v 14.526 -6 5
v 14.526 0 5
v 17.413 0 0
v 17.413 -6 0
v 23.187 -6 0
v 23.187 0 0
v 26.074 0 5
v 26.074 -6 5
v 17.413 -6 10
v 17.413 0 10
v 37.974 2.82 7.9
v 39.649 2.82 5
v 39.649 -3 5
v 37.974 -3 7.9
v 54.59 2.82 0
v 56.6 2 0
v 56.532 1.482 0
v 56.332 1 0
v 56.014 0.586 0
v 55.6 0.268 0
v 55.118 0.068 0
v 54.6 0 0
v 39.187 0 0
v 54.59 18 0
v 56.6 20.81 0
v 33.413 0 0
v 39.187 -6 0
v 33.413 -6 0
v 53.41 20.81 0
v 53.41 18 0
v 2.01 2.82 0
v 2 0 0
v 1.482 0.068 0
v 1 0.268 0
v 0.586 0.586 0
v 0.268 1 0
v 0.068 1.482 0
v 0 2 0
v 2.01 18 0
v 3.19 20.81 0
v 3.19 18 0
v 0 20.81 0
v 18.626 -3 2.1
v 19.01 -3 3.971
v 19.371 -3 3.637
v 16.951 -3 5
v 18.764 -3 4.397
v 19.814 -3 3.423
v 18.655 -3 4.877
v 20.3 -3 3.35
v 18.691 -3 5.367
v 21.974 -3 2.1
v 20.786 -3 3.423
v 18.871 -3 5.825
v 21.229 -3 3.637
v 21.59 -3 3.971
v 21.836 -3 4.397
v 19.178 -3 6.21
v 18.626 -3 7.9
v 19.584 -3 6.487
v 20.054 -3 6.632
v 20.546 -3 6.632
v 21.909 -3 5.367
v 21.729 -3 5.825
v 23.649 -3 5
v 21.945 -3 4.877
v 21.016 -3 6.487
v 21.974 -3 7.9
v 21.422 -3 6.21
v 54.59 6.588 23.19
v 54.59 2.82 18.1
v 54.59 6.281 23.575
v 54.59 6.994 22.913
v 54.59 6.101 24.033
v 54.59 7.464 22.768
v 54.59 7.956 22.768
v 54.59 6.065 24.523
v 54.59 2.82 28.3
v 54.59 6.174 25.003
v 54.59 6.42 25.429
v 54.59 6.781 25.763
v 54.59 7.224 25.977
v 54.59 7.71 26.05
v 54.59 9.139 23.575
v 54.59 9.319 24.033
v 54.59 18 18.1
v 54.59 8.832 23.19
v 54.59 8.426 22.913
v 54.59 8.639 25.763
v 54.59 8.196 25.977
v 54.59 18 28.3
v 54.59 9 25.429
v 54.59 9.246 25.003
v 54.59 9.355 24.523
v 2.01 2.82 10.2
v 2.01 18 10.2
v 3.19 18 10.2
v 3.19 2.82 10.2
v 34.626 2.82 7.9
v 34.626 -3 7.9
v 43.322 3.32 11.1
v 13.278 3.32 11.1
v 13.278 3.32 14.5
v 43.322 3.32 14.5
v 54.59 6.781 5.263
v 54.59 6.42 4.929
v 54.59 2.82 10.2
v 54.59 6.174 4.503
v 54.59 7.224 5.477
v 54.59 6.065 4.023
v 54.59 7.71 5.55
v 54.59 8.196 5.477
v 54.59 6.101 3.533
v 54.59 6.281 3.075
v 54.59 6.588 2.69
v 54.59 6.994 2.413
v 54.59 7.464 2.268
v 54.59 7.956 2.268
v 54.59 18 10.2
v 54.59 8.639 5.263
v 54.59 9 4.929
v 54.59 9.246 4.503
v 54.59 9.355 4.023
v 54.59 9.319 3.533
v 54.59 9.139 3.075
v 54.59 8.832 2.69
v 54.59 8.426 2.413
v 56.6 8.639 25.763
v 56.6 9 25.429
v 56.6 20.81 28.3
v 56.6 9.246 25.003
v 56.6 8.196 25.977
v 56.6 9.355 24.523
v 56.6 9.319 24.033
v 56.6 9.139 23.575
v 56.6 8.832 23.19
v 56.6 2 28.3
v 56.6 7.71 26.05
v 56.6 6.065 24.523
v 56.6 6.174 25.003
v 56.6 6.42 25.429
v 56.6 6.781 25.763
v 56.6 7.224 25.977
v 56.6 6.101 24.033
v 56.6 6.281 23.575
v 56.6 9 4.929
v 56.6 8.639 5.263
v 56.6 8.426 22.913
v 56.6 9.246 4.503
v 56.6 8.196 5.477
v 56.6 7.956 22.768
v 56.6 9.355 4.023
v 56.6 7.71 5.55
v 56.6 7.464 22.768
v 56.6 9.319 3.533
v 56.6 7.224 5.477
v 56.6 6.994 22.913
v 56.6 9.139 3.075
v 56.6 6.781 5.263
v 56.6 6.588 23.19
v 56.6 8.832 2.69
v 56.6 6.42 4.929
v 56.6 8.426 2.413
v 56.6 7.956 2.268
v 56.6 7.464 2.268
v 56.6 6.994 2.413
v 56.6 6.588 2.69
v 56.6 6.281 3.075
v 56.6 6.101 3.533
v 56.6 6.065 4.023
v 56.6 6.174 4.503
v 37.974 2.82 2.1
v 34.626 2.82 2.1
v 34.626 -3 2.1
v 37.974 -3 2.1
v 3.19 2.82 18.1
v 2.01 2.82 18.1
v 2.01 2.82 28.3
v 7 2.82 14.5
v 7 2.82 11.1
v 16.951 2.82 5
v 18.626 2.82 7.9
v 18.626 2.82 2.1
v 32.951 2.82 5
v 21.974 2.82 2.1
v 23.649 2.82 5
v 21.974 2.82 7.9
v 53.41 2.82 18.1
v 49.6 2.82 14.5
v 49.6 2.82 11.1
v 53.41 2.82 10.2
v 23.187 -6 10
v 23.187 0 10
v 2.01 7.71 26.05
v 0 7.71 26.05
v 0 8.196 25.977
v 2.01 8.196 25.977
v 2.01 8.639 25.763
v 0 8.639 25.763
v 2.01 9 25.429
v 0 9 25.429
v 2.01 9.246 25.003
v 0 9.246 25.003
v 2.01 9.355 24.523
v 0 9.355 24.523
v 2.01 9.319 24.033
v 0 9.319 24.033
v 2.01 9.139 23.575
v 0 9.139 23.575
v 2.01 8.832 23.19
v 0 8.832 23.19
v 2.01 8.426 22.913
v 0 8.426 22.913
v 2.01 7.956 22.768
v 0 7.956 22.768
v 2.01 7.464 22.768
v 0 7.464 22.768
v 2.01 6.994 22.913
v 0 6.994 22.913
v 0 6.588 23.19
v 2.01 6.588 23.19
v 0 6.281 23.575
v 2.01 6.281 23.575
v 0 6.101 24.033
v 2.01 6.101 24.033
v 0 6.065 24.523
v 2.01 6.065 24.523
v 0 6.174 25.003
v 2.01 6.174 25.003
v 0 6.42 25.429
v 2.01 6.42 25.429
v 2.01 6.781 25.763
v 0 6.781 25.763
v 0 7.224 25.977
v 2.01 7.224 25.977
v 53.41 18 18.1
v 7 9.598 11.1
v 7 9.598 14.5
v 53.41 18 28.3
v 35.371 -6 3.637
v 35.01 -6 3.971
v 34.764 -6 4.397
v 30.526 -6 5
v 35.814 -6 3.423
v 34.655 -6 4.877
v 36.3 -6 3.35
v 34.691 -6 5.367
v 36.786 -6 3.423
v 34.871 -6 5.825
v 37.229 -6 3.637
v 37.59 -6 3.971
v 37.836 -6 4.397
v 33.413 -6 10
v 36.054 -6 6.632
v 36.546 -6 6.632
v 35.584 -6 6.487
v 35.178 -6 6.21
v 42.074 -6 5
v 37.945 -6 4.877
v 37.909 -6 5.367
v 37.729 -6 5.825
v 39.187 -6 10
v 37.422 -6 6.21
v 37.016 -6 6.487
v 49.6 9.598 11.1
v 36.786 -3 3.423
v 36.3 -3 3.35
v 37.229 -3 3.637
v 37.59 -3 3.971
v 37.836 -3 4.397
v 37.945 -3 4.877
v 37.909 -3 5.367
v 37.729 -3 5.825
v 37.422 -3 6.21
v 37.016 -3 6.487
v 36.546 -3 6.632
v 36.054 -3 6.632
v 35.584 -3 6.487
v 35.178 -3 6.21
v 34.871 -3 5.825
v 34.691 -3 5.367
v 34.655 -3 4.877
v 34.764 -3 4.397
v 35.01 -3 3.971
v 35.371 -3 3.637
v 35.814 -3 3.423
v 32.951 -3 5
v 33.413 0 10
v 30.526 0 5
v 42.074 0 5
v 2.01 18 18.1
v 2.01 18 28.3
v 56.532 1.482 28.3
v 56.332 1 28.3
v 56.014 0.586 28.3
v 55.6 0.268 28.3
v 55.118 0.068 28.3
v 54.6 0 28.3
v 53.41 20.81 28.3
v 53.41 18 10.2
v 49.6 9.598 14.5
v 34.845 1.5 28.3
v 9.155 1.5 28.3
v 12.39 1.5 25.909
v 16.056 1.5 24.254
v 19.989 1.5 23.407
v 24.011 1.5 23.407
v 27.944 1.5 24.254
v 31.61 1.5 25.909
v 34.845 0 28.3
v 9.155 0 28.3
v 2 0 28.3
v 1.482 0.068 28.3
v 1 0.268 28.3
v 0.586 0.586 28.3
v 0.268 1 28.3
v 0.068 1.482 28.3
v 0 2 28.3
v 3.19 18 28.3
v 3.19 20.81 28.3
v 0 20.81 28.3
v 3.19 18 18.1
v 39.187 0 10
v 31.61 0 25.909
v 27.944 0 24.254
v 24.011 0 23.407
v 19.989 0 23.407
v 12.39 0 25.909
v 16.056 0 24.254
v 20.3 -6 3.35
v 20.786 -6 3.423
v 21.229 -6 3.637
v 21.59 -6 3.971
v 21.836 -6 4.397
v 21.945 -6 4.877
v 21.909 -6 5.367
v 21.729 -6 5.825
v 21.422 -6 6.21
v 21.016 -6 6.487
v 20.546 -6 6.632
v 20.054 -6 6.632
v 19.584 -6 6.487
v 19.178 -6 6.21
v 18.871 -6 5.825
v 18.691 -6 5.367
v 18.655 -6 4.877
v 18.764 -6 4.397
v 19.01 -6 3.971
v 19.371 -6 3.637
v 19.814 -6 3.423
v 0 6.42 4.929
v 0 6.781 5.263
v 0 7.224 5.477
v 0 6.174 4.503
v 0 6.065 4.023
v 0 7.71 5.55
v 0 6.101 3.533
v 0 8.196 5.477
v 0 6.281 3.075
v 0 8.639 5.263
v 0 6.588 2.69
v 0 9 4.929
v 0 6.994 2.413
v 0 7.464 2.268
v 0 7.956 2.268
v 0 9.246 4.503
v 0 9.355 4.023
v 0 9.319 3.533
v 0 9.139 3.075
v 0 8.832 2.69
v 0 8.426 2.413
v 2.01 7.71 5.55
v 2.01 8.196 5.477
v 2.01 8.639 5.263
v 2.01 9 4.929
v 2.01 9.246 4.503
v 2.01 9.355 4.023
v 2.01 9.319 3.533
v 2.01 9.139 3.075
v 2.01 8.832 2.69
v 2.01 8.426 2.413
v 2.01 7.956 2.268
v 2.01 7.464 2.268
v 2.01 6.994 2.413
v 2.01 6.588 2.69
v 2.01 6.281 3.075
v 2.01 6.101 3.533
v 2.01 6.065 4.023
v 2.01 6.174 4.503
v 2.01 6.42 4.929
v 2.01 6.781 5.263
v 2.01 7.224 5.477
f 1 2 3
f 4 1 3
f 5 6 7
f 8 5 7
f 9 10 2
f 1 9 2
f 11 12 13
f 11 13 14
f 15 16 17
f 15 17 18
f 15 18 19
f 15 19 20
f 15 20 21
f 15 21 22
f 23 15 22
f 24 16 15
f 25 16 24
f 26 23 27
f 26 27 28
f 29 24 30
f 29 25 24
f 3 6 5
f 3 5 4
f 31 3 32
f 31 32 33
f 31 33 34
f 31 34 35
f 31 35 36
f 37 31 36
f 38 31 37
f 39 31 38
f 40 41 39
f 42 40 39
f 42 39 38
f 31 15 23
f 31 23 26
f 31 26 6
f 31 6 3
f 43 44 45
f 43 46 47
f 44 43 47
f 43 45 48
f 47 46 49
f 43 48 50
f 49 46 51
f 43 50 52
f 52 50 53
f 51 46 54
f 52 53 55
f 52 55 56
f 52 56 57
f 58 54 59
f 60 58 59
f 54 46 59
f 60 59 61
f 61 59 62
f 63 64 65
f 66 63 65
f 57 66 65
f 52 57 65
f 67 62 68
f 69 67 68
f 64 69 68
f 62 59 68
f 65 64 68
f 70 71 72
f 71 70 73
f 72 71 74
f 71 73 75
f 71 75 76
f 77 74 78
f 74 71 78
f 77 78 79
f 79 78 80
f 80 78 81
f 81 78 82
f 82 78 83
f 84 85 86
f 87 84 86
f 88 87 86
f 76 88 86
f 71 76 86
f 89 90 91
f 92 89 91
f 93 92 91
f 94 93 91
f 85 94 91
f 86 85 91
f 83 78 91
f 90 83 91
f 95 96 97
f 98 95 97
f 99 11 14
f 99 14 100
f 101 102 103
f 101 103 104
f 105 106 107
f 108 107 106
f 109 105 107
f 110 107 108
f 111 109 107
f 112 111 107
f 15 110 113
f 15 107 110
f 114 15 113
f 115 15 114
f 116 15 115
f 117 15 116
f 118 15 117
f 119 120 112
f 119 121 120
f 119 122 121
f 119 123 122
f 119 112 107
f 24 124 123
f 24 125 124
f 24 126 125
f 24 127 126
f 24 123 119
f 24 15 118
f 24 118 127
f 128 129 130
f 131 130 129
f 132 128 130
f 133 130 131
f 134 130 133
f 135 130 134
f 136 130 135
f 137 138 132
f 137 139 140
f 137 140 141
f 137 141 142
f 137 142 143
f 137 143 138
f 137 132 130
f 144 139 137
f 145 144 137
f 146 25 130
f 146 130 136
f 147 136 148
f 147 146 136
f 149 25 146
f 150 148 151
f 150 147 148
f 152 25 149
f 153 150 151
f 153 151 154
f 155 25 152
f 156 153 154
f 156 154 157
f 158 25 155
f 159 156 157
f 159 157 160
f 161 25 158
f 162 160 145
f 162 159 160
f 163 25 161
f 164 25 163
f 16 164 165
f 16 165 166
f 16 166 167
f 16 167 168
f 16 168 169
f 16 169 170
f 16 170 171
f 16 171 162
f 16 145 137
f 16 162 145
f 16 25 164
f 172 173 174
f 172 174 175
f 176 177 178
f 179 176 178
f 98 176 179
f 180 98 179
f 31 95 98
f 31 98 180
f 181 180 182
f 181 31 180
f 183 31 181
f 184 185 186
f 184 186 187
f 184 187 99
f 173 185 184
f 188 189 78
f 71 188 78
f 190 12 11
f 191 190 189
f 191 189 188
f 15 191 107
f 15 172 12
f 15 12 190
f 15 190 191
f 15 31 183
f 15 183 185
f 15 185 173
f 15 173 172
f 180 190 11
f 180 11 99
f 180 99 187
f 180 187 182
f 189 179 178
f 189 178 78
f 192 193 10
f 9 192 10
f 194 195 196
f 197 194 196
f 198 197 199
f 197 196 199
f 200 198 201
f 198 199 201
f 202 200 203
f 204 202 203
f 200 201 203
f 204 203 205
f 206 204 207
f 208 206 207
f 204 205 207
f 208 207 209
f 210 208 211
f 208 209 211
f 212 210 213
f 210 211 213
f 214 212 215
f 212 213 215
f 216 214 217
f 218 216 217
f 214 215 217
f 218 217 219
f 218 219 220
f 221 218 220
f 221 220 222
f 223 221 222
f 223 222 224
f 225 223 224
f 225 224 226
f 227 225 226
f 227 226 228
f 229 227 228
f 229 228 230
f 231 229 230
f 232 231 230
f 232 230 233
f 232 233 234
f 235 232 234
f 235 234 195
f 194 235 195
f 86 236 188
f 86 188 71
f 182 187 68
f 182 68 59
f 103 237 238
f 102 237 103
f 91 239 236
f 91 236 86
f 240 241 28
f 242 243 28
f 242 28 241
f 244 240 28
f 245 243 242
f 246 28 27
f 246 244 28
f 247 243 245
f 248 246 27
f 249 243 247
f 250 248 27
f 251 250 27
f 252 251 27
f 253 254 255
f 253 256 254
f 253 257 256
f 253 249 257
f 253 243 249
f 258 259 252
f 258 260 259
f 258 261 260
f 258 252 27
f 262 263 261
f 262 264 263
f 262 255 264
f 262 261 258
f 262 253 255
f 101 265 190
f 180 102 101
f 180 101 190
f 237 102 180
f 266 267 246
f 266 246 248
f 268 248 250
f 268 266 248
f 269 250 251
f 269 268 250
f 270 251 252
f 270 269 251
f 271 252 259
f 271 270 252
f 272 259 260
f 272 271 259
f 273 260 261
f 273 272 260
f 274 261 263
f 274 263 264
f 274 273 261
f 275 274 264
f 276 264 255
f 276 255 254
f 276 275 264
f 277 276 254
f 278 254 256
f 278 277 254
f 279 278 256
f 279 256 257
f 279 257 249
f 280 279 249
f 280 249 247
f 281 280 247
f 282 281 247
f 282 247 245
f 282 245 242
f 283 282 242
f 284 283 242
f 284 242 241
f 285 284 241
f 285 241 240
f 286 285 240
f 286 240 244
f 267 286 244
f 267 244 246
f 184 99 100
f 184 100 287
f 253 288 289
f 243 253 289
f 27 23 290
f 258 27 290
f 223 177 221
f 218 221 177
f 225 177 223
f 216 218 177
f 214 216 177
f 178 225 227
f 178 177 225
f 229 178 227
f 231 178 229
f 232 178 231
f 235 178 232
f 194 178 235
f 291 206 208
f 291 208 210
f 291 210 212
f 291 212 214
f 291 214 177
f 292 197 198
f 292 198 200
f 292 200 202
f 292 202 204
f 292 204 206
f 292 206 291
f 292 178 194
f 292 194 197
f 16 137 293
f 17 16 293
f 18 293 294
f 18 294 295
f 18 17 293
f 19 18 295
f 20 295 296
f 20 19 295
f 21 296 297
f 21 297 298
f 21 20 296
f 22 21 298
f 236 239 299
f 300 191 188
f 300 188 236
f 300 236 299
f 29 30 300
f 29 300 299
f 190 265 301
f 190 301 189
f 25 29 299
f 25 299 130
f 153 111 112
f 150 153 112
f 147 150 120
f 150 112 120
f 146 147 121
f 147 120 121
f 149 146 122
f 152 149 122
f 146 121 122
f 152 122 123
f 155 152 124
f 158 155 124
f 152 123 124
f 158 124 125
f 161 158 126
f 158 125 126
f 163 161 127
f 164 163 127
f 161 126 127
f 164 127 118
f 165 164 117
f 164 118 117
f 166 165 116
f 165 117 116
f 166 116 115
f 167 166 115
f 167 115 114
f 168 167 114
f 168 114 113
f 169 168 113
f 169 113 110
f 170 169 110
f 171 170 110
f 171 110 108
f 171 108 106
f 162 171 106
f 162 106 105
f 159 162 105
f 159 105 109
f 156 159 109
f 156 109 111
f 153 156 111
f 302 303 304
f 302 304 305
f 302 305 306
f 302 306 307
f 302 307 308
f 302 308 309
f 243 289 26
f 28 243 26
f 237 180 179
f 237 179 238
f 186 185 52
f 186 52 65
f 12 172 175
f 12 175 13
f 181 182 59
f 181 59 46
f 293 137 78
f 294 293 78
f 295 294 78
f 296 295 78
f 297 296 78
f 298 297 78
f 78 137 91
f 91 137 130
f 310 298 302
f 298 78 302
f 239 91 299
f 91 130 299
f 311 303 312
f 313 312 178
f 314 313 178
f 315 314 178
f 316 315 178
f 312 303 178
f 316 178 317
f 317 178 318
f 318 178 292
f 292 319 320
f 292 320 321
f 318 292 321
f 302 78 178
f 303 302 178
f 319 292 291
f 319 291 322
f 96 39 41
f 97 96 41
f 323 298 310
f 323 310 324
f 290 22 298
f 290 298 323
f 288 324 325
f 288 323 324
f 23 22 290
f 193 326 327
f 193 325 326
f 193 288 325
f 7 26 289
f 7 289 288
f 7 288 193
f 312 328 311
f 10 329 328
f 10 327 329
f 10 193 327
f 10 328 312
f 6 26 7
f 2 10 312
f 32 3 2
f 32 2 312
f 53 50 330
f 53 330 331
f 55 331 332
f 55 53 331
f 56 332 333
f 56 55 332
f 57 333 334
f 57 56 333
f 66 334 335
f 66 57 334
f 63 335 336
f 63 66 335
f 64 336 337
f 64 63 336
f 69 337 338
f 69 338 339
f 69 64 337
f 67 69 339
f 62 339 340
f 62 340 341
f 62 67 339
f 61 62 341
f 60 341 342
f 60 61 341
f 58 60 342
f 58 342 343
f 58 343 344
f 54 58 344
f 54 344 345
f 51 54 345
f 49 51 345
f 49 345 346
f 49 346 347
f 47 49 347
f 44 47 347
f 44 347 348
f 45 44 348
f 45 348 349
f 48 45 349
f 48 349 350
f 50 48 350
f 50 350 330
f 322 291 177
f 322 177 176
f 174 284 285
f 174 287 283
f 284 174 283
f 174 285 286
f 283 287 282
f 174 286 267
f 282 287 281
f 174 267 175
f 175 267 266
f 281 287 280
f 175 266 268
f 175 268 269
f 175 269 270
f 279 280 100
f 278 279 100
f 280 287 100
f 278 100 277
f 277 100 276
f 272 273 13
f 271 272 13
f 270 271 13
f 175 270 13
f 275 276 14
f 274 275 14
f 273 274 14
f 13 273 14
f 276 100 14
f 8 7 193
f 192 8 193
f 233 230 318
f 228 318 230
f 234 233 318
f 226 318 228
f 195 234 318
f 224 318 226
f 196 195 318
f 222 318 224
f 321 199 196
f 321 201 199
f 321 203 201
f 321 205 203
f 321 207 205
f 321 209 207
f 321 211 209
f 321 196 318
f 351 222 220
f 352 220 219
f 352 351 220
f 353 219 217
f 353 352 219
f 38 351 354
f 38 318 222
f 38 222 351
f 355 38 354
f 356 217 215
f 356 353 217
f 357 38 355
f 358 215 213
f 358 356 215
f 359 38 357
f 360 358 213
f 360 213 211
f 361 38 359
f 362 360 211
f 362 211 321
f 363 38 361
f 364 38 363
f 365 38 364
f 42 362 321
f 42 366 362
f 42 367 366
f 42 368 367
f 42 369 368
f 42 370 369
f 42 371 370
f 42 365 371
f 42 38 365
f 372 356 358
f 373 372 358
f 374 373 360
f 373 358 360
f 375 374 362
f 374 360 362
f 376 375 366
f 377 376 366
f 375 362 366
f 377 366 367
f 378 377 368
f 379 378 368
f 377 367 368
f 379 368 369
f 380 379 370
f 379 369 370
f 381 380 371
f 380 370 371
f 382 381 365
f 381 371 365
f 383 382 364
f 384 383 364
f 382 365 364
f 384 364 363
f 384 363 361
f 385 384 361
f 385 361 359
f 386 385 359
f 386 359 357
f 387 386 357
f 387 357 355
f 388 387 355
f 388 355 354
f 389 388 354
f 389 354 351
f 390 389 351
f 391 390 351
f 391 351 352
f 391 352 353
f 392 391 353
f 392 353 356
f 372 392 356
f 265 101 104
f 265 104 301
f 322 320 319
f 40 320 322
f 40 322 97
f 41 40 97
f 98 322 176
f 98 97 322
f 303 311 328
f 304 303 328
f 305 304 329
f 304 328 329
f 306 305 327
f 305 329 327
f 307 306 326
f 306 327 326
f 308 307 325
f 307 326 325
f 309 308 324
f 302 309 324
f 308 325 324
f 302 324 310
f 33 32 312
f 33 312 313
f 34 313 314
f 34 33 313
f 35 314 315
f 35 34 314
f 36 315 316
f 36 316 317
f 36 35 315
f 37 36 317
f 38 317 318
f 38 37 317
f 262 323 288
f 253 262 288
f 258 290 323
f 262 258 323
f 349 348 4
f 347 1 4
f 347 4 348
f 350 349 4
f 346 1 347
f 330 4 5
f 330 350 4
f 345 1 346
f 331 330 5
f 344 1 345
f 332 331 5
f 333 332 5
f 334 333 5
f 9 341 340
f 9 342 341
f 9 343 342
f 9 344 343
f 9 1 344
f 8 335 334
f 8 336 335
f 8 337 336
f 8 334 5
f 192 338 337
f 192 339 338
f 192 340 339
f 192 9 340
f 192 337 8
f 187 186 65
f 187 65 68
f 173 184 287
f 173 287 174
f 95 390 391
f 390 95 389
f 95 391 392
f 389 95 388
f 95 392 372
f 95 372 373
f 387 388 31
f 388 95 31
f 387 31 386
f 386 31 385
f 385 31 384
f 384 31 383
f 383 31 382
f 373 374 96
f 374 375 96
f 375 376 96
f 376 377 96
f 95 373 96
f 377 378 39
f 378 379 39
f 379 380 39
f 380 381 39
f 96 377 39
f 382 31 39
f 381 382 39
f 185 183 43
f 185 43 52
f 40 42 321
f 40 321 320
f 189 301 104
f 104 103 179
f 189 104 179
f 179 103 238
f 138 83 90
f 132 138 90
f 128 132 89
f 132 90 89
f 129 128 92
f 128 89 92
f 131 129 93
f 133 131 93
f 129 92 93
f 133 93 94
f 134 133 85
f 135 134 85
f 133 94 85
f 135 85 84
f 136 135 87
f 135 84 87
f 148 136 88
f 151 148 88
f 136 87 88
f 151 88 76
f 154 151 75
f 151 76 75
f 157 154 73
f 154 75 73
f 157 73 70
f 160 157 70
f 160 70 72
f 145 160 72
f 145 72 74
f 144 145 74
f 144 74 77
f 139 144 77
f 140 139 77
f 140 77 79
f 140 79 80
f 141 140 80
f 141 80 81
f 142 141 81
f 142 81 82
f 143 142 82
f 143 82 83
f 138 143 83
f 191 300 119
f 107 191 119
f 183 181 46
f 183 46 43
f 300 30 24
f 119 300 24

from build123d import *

# Parameters (mm, degrees)
BOSS_EXTRUDE1_DEPTH = 28.3
SKETCH2_W           = 52.58
SKETCH2_H           = 15.18
CUT_EXTRUDE1_DEPTH  = 10.2
CUT_EXTRUDE2_START  = 28.3
SKETCH2_2_W         = 52.58
SKETCH2_2_H         = 15.18
CUT_EXTRUDE2_DEPTH  = 10.2
CUT_EXTRUDE3_REACH  = 68.615
SKETCH3_R           = 1.65
BOSS_EXTRUDE2_START = 11.1
BOSS_EXTRUDE2_DEPTH = 3.4
CUT_EXTRUDE4_DEPTH  = 1.5
SKETCH6_R           = 1.65
BOSS_EXTRUDE3_DEPTH = 6
CUT_EXTRUDE5_START  = -8.82
CUT_EXTRUDE5_DEPTH  = 5.82


with BuildPart() as part:
    # Sketch1 → Boss-Extrude1 (new body)
    with BuildSketch(Plane.XY):
        with BuildLine():
            Line((0, 20.81), (3.19, 20.81))
            Line((3.19, 20.81), (3.19, 2.82))
            Line((3.19, 2.82), (53.41, 2.82))
            Line((53.41, 2.82), (53.41, 20.81))
            Line((53.41, 20.81), (56.6, 20.81))
            Line((56.6, 20.81), (56.6, 2))
            ThreePointArc((56.6, 2), (56.014213562, 0.585786438), (54.6, 0))
            Line((54.6, 0), (2, 0))
            ThreePointArc((2, 0), (0.585786438, 0.585786438), (0, 2))
            Line((0, 2), (0, 20.81))
        make_face()
    extrude(amount=BOSS_EXTRUDE1_DEPTH)

    # Sketch2 → Cut-Extrude1 (cut)
    with BuildSketch(Plane.XY):
        with Locations((28.3, 10.41)):
            Rectangle(SKETCH2_W, SKETCH2_H)
    extrude(amount=CUT_EXTRUDE1_DEPTH, mode=Mode.SUBTRACT)

    # Sketch2<2> → Cut-Extrude2 (cut)
    with BuildSketch(Plane.XY.offset(CUT_EXTRUDE2_START)):
        with Locations((28.3, 10.41)):
            Rectangle(SKETCH2_2_W, SKETCH2_2_H)
    extrude(amount=-CUT_EXTRUDE2_DEPTH, mode=Mode.SUBTRACT)

    # Cut-Extrude3: up to this face of the body (flat: up to its plane)
    cut_extrude3_end = Plane(part.part.faces().sort_by_distance((56.6, 11.405, 14.15))[0])
    # Sketch3 → Cut-Extrude3 (cut, up to the picked face)
    with BuildSketch(Plane.ZY, mode=Mode.PRIVATE) as cut_extrude3_sk1:
        with Locations((3.9, 7.71)):
            Circle(SKETCH3_R)
    cut_extrude3_tool1 = split(extrude(cut_extrude3_sk1.sketch, amount=-CUT_EXTRUDE3_REACH, mode=Mode.PRIVATE), bisect_by=cut_extrude3_end, keep=Keep.BOTH, mode=Mode.PRIVATE)
    # Sketch3 → Cut-Extrude3 (cut, up to the picked face)
    with BuildSketch(Plane.ZY, mode=Mode.PRIVATE) as cut_extrude3_sk2:
        with Locations((24.4, 7.71)):
            Circle(SKETCH3_R)
    cut_extrude3_tool2 = split(extrude(cut_extrude3_sk2.sketch, amount=-CUT_EXTRUDE3_REACH, mode=Mode.PRIVATE), bisect_by=cut_extrude3_end, keep=Keep.BOTH, mode=Mode.PRIVATE)
    add(cut_extrude3_tool1.solids().sort_by(Axis((0, 7.71, 3.9), (1, 0, 0)))[0], mode=Mode.SUBTRACT)
    add(cut_extrude3_tool2.solids().sort_by(Axis((0, 7.71, 24.4), (1, 0, 0)))[0], mode=Mode.SUBTRACT)

    # Sketch4 → Boss-Extrude2 (add)
    with BuildSketch(Plane.XY.offset(BOSS_EXTRUDE2_START)):
        Polygon((7, 9.598174593), (13.278174593, 3.32), (43.321825407, 3.32), (49.6, 9.598174593), (49.6, 2.82), (7, 2.82), align=None)
    extrude(amount=BOSS_EXTRUDE2_DEPTH)

    # Sketch5 → Cut-Extrude4 (cut)
    with BuildSketch(Plane.XZ):
        with BuildLine():
            Line((34.845232579, 28.3), (9.154767421, 28.3))
            ThreePointArc((9.154767421, 28.3), (22, 23.3), (34.845232579, 28.3))
        make_face()
    extrude(amount=-CUT_EXTRUDE4_DEPTH, mode=Mode.SUBTRACT)

    # Sketch6 → Boss-Extrude3 (add)
    # profile 1 of 2: a face of its own
    with BuildSketch(Plane.XZ):
        Polygon((26.073502692, 5), (23.186751346, 10), (17.413248654, 10), (14.526497308, 5), (17.413248654, 0), (23.186751346, 0), align=None)
        with Locations(Location((20.3, 5, 0), (0, 0, 270))):
            Circle(SKETCH6_R, mode=Mode.SUBTRACT)
    # profile 2 of 2: a face of its own
    with BuildSketch(Plane.XZ):
        Polygon((42.073502692, 5), (39.186751346, 10), (33.413248654, 10), (30.526497308, 5), (33.413248654, 0), (39.186751346, 0), align=None)
        with Locations(Location((36.3, 5, 0), (0, 0, 270))):
            Circle(SKETCH6_R, mode=Mode.SUBTRACT)
    extrude(amount=BOSS_EXTRUDE3_DEPTH)

    # Sketch8 → Cut-Extrude5 (cut)
    with BuildSketch(Plane.XZ.offset(6).offset(CUT_EXTRUDE5_START)):
        Polygon((23.648631561, 5), (21.974315781, 7.9), (18.625684219, 7.9), (16.951368439, 5), (18.625684219, 2.1), (21.974315781, 2.1), align=None)
        Polygon((39.648631561, 5), (37.974315781, 7.9), (34.625684219, 7.9), (32.951368439, 5), (34.625684219, 2.1), (37.974315781, 2.1), align=None)
    extrude(amount=CUT_EXTRUDE5_DEPTH, mode=Mode.SUBTRACT)


solid = part.part
